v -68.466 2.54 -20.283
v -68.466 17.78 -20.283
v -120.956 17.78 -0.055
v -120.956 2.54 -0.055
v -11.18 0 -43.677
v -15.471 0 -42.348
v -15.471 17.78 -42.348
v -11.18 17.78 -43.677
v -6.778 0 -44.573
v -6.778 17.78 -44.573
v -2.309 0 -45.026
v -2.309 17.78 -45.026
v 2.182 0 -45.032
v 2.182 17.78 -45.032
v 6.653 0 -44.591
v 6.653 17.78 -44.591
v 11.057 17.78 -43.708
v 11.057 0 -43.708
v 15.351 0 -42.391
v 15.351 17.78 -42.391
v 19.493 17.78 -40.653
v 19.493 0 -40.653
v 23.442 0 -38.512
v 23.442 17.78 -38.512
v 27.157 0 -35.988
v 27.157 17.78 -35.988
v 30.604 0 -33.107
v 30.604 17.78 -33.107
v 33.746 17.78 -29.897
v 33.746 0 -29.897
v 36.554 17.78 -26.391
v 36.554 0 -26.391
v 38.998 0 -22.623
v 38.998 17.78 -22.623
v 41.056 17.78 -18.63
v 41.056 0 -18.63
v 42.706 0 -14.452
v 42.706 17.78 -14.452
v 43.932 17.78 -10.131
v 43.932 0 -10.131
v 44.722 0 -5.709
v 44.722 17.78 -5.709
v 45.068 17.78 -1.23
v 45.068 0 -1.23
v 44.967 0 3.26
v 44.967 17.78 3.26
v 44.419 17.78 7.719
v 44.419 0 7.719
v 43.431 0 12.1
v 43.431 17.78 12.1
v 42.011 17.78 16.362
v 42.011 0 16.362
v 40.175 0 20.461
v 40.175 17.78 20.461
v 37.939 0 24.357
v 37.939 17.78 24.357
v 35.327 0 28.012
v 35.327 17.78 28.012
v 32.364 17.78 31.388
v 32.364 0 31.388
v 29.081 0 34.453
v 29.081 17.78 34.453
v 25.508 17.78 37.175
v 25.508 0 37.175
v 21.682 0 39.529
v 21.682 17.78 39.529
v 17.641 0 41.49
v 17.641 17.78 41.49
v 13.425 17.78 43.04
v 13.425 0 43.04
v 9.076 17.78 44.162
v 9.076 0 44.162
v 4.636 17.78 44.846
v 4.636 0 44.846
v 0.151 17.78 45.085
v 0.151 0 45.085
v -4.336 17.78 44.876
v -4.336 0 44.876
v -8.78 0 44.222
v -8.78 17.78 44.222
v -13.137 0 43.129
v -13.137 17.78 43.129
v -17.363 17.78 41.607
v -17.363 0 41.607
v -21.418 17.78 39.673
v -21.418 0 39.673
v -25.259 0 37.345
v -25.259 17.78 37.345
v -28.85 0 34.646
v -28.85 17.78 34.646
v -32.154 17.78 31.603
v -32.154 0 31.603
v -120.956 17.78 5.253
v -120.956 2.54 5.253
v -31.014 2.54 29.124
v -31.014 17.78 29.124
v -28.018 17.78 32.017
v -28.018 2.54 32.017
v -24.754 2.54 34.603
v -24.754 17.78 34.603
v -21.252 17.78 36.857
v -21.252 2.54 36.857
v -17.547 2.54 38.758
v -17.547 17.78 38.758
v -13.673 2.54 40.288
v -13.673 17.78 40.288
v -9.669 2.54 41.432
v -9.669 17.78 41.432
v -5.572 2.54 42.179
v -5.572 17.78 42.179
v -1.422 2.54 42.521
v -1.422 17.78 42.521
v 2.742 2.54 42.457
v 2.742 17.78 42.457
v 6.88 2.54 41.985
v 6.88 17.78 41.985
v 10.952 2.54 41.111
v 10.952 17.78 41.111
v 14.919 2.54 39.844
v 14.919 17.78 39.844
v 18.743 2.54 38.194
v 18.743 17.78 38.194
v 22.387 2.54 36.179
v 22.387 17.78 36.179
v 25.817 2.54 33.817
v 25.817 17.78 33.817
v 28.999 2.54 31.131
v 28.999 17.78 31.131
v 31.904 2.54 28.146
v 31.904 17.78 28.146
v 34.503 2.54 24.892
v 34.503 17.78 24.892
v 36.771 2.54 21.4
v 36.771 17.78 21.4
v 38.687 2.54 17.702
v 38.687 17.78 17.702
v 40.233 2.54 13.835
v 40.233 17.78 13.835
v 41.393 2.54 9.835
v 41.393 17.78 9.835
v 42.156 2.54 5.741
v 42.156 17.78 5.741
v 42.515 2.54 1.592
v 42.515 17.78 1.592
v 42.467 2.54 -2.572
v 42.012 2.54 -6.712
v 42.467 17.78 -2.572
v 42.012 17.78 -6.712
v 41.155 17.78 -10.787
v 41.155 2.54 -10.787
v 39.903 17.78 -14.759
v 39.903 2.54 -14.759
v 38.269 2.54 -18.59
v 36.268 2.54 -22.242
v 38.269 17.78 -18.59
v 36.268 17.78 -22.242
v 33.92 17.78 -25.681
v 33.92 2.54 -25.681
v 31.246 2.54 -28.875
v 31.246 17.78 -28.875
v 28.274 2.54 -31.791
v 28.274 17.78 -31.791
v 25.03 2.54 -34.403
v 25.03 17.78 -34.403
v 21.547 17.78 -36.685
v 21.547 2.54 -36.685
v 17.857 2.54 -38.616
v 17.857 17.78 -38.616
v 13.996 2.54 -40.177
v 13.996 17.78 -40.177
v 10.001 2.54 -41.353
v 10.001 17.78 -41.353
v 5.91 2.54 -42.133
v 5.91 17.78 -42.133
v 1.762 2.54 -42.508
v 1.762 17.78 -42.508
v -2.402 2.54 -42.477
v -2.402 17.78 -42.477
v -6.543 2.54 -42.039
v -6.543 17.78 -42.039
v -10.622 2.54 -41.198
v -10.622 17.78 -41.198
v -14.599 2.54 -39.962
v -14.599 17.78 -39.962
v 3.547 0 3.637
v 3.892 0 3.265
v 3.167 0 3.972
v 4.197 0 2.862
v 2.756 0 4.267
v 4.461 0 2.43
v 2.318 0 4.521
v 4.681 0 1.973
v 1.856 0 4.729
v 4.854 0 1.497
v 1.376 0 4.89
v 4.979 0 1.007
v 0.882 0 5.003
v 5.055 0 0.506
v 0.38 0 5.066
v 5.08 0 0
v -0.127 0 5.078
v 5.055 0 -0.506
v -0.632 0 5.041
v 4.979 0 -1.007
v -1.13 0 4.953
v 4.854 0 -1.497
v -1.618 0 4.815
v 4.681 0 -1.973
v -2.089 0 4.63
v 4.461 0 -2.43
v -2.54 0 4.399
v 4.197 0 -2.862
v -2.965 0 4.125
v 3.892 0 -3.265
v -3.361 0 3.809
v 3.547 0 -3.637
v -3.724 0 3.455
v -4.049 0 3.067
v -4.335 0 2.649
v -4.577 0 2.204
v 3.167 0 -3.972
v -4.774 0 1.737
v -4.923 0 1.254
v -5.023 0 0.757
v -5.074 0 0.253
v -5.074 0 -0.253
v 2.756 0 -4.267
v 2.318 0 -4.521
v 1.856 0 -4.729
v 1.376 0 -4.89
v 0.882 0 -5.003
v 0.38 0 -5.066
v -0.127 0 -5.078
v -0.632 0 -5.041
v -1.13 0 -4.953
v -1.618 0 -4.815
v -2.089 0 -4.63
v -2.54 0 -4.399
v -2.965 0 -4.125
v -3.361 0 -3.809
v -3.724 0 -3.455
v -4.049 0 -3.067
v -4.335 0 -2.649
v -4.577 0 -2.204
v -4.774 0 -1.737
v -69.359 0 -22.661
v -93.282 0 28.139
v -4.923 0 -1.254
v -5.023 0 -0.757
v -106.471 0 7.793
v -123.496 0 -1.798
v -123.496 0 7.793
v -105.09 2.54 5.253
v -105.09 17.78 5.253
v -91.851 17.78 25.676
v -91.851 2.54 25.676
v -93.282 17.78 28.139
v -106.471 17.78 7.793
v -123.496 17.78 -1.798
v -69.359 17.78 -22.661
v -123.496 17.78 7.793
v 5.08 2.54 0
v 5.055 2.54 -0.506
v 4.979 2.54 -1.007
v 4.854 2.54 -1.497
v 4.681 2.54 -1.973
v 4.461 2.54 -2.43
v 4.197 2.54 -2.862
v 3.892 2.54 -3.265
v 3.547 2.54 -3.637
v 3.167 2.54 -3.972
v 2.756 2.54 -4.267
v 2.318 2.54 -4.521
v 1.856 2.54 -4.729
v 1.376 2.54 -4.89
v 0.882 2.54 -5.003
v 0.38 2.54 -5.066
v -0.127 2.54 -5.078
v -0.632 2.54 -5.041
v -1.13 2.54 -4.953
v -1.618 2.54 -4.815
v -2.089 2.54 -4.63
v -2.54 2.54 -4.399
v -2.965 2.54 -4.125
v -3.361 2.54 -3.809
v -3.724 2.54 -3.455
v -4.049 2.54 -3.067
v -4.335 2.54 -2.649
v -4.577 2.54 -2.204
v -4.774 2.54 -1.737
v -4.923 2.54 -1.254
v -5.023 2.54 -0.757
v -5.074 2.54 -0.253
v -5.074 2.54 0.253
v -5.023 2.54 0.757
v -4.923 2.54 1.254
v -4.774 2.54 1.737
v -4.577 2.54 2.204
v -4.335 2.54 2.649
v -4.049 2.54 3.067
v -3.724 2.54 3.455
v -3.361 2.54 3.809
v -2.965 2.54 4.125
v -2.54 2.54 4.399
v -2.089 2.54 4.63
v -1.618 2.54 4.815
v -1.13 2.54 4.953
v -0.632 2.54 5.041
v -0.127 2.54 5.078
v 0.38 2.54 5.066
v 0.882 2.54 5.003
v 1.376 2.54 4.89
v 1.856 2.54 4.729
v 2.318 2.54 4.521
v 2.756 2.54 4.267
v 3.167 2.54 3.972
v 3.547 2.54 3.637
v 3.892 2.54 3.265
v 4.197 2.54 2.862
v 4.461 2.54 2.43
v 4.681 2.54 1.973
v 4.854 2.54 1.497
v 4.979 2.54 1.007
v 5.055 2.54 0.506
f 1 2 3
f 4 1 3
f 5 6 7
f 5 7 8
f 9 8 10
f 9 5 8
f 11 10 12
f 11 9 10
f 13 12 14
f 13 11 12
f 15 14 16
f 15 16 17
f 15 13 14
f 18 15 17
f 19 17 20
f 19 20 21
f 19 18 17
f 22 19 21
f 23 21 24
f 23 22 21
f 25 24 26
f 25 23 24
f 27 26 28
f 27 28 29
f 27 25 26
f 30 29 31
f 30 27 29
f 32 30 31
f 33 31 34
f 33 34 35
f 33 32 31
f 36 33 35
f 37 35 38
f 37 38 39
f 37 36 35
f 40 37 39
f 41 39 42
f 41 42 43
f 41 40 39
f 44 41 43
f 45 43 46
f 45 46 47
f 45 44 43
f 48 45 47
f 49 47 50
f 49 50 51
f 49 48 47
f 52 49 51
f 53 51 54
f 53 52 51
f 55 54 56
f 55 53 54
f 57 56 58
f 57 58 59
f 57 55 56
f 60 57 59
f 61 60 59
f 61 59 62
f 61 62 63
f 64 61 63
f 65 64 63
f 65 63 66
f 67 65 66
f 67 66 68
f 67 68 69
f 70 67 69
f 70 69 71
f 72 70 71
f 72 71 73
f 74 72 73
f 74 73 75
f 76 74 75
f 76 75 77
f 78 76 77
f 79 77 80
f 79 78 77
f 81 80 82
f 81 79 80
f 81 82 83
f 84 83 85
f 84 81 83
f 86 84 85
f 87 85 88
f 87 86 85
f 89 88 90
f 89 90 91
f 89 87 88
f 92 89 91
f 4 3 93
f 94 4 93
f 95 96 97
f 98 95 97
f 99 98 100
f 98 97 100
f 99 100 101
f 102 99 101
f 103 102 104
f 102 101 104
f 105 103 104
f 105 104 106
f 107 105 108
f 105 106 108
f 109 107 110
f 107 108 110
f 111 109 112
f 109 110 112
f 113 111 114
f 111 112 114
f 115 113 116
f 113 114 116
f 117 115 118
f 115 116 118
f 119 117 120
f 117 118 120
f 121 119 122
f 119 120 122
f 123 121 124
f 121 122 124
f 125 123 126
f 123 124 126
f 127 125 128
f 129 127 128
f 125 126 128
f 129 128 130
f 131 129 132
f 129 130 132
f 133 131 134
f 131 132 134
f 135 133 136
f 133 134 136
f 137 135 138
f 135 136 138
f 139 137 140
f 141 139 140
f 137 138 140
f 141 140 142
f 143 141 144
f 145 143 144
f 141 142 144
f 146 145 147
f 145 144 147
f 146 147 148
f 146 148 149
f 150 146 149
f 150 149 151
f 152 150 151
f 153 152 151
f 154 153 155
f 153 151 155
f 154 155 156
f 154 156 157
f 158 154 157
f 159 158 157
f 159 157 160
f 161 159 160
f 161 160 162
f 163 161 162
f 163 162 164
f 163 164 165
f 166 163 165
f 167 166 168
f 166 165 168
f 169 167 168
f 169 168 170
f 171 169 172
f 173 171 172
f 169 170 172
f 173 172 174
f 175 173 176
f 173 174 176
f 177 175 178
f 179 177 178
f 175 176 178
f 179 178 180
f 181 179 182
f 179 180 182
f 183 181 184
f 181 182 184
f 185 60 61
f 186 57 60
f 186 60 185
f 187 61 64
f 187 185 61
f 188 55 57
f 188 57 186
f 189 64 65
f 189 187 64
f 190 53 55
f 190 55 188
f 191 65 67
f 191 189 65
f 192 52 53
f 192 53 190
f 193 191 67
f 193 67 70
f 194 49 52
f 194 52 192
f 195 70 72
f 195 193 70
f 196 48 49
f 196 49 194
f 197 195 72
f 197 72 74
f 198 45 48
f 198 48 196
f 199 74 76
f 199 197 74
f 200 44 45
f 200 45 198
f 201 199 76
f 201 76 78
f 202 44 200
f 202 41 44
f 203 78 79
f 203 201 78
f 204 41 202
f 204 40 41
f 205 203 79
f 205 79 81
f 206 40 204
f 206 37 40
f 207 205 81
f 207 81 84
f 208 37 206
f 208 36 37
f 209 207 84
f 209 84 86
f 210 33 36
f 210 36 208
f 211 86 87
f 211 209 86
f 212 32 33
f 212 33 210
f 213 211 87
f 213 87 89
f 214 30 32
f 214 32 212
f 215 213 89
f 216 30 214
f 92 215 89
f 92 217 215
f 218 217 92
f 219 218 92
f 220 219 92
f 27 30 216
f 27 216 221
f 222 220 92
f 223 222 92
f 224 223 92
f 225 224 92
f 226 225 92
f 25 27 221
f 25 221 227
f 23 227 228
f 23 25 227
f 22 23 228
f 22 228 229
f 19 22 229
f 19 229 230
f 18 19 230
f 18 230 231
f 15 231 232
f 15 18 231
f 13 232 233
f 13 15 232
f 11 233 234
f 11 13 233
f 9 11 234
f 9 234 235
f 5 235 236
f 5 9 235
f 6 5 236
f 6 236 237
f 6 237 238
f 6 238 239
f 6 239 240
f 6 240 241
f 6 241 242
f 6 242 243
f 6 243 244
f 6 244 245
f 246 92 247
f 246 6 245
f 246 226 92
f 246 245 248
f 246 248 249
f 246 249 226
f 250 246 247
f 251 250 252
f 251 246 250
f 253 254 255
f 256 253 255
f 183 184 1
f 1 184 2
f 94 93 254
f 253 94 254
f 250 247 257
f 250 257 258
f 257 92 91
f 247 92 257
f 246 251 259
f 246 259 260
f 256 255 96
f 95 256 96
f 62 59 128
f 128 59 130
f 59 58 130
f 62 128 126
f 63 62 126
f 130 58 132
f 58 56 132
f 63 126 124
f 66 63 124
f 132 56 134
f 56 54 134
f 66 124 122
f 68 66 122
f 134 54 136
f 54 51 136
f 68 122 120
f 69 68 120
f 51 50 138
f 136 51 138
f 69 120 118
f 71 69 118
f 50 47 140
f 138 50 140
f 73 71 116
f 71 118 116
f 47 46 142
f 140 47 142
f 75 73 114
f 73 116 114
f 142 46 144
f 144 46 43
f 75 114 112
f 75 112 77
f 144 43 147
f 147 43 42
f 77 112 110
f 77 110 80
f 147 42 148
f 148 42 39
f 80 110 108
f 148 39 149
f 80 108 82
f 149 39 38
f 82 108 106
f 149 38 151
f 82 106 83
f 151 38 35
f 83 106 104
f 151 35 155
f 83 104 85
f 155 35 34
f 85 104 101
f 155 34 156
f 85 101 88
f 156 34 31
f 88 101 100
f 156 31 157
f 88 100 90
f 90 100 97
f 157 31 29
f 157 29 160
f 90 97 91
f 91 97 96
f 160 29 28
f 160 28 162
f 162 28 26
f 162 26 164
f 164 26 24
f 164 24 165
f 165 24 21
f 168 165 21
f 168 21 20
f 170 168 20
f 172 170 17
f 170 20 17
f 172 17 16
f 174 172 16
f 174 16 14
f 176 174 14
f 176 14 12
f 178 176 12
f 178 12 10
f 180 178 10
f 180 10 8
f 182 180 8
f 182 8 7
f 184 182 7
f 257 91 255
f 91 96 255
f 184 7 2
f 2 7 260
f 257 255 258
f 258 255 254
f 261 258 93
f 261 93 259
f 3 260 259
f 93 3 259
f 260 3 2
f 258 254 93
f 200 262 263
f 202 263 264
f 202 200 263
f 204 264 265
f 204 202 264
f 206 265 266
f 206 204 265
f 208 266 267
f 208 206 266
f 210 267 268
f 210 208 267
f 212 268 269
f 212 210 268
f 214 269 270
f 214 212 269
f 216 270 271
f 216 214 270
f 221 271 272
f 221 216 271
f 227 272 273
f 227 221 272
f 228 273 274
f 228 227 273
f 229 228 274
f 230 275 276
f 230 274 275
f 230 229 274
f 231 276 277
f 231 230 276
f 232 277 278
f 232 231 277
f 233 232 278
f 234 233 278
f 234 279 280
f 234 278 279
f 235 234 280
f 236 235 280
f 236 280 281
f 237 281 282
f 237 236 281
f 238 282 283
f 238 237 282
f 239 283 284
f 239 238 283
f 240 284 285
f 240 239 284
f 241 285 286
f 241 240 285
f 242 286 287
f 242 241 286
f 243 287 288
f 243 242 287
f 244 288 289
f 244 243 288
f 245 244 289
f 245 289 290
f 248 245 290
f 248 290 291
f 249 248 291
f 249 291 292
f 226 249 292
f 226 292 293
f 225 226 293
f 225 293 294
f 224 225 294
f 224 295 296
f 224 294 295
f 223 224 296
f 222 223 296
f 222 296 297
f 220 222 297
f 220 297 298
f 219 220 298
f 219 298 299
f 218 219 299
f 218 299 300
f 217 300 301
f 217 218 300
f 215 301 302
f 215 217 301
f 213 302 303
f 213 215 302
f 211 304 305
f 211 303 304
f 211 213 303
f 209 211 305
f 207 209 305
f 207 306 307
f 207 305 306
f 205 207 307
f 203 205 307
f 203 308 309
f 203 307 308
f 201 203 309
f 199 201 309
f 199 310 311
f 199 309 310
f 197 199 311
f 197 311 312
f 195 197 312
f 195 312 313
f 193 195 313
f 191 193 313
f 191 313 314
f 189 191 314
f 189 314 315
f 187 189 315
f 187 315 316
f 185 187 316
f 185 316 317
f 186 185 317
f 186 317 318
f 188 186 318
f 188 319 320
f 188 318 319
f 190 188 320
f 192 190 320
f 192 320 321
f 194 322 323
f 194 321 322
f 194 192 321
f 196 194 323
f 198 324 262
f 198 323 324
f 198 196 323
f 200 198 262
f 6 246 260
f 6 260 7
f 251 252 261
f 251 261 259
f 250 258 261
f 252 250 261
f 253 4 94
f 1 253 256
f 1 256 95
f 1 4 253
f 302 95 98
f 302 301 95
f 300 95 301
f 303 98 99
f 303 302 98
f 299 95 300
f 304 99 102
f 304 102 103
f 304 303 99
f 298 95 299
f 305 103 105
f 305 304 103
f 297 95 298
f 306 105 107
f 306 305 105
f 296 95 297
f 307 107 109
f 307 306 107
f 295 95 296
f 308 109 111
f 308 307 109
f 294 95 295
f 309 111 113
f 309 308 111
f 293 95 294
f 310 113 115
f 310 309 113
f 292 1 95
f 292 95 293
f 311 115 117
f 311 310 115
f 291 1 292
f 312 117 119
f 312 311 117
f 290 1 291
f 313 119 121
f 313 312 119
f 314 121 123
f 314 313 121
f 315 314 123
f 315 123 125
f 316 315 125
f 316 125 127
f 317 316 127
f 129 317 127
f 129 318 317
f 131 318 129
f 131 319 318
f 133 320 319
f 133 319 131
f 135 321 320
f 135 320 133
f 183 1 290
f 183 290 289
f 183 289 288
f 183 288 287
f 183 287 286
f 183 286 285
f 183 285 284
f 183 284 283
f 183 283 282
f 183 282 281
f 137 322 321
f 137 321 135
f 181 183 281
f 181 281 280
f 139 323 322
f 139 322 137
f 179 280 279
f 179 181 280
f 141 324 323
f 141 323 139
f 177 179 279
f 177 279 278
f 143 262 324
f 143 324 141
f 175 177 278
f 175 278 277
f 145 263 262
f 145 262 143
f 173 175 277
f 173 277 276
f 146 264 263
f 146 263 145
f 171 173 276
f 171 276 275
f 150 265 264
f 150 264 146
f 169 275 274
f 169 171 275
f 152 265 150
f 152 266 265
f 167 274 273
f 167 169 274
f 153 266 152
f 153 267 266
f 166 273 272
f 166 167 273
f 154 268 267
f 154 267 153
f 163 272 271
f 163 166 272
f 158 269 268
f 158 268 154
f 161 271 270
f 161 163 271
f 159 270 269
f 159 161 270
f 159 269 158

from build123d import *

# Parameters (mm, degrees)
SKETCH1_R           = 5.08
BOSS_EXTRUDE1_DEPTH = 17.78
CUT_EXTRUDE1_DEPTH  = 15.24


with BuildPart() as part:
    # Sketch1 → Boss-Extrude1 (new body)
    with BuildSketch(Plane(origin=(0, 0, 0), x_dir=(1, 0, 0), z_dir=(0, 1, 0))):
        with BuildLine():
            Line((-32.154011799, -31.603429406), (-93.281689982, -28.139023899))
            Line((-93.281689982, -28.139023899), (-106.470617871, -7.793457389))
            Line((-106.470617871, -7.793457389), (-123.496324783, -7.793457389))
            Line((-123.496324783, -7.793457389), (-123.496324783, 1.798490167))
            Line((-123.496324783, 1.798490167), (-69.358514677, 22.660976101))
            Line((-69.358514677, 22.660976101), (-15.470629933, 42.347571766))
            ThreePointArc((-15.470629933, 42.347571766), (43.979702916, -9.921842389), (-32.154011799, -31.603429406))
        make_face()
        Circle(SKETCH1_R, mode=Mode.SUBTRACT)
    extrude(amount=BOSS_EXTRUDE1_DEPTH)

    # Sketch2 → Cut-Extrude1 (cut)
    with BuildSketch(Plane(origin=(0, 17.78, 0), x_dir=(1, 0, 0), z_dir=(0, 1, 0))):
        with BuildLine():
            Line((-14.599045148, 39.961793075), (-68.465982608, 20.282849978))
            Line((-68.465982608, 20.282849978), (-120.956324783, 0.055230443))
            Line((-120.956324783, 0.055230443), (-120.956324783, -5.253457389))
            Line((-120.956324783, -5.253457389), (-105.090165624, -5.253457389))
            Line((-105.090165624, -5.253457389), (-91.851329605, -25.676013414))
            Line((-91.851329605, -25.676013414), (-31.014061001, -29.123959985))
            ThreePointArc((-31.014061001, -29.123959985), (41.392622315, -9.835031413), (-14.599045148, 39.961793075))
        make_face()
    extrude(amount=-CUT_EXTRUDE1_DEPTH, mode=Mode.SUBTRACT)


solid = part.part
